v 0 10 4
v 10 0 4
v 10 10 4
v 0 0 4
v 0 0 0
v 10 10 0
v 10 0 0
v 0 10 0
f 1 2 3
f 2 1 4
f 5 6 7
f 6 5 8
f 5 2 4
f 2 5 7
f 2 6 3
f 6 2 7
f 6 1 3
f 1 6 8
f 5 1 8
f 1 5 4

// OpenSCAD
// Construct: color() — a rendering attribute that passes geometry through.
color("SteelBlue") cube([10, 10, 4]);
